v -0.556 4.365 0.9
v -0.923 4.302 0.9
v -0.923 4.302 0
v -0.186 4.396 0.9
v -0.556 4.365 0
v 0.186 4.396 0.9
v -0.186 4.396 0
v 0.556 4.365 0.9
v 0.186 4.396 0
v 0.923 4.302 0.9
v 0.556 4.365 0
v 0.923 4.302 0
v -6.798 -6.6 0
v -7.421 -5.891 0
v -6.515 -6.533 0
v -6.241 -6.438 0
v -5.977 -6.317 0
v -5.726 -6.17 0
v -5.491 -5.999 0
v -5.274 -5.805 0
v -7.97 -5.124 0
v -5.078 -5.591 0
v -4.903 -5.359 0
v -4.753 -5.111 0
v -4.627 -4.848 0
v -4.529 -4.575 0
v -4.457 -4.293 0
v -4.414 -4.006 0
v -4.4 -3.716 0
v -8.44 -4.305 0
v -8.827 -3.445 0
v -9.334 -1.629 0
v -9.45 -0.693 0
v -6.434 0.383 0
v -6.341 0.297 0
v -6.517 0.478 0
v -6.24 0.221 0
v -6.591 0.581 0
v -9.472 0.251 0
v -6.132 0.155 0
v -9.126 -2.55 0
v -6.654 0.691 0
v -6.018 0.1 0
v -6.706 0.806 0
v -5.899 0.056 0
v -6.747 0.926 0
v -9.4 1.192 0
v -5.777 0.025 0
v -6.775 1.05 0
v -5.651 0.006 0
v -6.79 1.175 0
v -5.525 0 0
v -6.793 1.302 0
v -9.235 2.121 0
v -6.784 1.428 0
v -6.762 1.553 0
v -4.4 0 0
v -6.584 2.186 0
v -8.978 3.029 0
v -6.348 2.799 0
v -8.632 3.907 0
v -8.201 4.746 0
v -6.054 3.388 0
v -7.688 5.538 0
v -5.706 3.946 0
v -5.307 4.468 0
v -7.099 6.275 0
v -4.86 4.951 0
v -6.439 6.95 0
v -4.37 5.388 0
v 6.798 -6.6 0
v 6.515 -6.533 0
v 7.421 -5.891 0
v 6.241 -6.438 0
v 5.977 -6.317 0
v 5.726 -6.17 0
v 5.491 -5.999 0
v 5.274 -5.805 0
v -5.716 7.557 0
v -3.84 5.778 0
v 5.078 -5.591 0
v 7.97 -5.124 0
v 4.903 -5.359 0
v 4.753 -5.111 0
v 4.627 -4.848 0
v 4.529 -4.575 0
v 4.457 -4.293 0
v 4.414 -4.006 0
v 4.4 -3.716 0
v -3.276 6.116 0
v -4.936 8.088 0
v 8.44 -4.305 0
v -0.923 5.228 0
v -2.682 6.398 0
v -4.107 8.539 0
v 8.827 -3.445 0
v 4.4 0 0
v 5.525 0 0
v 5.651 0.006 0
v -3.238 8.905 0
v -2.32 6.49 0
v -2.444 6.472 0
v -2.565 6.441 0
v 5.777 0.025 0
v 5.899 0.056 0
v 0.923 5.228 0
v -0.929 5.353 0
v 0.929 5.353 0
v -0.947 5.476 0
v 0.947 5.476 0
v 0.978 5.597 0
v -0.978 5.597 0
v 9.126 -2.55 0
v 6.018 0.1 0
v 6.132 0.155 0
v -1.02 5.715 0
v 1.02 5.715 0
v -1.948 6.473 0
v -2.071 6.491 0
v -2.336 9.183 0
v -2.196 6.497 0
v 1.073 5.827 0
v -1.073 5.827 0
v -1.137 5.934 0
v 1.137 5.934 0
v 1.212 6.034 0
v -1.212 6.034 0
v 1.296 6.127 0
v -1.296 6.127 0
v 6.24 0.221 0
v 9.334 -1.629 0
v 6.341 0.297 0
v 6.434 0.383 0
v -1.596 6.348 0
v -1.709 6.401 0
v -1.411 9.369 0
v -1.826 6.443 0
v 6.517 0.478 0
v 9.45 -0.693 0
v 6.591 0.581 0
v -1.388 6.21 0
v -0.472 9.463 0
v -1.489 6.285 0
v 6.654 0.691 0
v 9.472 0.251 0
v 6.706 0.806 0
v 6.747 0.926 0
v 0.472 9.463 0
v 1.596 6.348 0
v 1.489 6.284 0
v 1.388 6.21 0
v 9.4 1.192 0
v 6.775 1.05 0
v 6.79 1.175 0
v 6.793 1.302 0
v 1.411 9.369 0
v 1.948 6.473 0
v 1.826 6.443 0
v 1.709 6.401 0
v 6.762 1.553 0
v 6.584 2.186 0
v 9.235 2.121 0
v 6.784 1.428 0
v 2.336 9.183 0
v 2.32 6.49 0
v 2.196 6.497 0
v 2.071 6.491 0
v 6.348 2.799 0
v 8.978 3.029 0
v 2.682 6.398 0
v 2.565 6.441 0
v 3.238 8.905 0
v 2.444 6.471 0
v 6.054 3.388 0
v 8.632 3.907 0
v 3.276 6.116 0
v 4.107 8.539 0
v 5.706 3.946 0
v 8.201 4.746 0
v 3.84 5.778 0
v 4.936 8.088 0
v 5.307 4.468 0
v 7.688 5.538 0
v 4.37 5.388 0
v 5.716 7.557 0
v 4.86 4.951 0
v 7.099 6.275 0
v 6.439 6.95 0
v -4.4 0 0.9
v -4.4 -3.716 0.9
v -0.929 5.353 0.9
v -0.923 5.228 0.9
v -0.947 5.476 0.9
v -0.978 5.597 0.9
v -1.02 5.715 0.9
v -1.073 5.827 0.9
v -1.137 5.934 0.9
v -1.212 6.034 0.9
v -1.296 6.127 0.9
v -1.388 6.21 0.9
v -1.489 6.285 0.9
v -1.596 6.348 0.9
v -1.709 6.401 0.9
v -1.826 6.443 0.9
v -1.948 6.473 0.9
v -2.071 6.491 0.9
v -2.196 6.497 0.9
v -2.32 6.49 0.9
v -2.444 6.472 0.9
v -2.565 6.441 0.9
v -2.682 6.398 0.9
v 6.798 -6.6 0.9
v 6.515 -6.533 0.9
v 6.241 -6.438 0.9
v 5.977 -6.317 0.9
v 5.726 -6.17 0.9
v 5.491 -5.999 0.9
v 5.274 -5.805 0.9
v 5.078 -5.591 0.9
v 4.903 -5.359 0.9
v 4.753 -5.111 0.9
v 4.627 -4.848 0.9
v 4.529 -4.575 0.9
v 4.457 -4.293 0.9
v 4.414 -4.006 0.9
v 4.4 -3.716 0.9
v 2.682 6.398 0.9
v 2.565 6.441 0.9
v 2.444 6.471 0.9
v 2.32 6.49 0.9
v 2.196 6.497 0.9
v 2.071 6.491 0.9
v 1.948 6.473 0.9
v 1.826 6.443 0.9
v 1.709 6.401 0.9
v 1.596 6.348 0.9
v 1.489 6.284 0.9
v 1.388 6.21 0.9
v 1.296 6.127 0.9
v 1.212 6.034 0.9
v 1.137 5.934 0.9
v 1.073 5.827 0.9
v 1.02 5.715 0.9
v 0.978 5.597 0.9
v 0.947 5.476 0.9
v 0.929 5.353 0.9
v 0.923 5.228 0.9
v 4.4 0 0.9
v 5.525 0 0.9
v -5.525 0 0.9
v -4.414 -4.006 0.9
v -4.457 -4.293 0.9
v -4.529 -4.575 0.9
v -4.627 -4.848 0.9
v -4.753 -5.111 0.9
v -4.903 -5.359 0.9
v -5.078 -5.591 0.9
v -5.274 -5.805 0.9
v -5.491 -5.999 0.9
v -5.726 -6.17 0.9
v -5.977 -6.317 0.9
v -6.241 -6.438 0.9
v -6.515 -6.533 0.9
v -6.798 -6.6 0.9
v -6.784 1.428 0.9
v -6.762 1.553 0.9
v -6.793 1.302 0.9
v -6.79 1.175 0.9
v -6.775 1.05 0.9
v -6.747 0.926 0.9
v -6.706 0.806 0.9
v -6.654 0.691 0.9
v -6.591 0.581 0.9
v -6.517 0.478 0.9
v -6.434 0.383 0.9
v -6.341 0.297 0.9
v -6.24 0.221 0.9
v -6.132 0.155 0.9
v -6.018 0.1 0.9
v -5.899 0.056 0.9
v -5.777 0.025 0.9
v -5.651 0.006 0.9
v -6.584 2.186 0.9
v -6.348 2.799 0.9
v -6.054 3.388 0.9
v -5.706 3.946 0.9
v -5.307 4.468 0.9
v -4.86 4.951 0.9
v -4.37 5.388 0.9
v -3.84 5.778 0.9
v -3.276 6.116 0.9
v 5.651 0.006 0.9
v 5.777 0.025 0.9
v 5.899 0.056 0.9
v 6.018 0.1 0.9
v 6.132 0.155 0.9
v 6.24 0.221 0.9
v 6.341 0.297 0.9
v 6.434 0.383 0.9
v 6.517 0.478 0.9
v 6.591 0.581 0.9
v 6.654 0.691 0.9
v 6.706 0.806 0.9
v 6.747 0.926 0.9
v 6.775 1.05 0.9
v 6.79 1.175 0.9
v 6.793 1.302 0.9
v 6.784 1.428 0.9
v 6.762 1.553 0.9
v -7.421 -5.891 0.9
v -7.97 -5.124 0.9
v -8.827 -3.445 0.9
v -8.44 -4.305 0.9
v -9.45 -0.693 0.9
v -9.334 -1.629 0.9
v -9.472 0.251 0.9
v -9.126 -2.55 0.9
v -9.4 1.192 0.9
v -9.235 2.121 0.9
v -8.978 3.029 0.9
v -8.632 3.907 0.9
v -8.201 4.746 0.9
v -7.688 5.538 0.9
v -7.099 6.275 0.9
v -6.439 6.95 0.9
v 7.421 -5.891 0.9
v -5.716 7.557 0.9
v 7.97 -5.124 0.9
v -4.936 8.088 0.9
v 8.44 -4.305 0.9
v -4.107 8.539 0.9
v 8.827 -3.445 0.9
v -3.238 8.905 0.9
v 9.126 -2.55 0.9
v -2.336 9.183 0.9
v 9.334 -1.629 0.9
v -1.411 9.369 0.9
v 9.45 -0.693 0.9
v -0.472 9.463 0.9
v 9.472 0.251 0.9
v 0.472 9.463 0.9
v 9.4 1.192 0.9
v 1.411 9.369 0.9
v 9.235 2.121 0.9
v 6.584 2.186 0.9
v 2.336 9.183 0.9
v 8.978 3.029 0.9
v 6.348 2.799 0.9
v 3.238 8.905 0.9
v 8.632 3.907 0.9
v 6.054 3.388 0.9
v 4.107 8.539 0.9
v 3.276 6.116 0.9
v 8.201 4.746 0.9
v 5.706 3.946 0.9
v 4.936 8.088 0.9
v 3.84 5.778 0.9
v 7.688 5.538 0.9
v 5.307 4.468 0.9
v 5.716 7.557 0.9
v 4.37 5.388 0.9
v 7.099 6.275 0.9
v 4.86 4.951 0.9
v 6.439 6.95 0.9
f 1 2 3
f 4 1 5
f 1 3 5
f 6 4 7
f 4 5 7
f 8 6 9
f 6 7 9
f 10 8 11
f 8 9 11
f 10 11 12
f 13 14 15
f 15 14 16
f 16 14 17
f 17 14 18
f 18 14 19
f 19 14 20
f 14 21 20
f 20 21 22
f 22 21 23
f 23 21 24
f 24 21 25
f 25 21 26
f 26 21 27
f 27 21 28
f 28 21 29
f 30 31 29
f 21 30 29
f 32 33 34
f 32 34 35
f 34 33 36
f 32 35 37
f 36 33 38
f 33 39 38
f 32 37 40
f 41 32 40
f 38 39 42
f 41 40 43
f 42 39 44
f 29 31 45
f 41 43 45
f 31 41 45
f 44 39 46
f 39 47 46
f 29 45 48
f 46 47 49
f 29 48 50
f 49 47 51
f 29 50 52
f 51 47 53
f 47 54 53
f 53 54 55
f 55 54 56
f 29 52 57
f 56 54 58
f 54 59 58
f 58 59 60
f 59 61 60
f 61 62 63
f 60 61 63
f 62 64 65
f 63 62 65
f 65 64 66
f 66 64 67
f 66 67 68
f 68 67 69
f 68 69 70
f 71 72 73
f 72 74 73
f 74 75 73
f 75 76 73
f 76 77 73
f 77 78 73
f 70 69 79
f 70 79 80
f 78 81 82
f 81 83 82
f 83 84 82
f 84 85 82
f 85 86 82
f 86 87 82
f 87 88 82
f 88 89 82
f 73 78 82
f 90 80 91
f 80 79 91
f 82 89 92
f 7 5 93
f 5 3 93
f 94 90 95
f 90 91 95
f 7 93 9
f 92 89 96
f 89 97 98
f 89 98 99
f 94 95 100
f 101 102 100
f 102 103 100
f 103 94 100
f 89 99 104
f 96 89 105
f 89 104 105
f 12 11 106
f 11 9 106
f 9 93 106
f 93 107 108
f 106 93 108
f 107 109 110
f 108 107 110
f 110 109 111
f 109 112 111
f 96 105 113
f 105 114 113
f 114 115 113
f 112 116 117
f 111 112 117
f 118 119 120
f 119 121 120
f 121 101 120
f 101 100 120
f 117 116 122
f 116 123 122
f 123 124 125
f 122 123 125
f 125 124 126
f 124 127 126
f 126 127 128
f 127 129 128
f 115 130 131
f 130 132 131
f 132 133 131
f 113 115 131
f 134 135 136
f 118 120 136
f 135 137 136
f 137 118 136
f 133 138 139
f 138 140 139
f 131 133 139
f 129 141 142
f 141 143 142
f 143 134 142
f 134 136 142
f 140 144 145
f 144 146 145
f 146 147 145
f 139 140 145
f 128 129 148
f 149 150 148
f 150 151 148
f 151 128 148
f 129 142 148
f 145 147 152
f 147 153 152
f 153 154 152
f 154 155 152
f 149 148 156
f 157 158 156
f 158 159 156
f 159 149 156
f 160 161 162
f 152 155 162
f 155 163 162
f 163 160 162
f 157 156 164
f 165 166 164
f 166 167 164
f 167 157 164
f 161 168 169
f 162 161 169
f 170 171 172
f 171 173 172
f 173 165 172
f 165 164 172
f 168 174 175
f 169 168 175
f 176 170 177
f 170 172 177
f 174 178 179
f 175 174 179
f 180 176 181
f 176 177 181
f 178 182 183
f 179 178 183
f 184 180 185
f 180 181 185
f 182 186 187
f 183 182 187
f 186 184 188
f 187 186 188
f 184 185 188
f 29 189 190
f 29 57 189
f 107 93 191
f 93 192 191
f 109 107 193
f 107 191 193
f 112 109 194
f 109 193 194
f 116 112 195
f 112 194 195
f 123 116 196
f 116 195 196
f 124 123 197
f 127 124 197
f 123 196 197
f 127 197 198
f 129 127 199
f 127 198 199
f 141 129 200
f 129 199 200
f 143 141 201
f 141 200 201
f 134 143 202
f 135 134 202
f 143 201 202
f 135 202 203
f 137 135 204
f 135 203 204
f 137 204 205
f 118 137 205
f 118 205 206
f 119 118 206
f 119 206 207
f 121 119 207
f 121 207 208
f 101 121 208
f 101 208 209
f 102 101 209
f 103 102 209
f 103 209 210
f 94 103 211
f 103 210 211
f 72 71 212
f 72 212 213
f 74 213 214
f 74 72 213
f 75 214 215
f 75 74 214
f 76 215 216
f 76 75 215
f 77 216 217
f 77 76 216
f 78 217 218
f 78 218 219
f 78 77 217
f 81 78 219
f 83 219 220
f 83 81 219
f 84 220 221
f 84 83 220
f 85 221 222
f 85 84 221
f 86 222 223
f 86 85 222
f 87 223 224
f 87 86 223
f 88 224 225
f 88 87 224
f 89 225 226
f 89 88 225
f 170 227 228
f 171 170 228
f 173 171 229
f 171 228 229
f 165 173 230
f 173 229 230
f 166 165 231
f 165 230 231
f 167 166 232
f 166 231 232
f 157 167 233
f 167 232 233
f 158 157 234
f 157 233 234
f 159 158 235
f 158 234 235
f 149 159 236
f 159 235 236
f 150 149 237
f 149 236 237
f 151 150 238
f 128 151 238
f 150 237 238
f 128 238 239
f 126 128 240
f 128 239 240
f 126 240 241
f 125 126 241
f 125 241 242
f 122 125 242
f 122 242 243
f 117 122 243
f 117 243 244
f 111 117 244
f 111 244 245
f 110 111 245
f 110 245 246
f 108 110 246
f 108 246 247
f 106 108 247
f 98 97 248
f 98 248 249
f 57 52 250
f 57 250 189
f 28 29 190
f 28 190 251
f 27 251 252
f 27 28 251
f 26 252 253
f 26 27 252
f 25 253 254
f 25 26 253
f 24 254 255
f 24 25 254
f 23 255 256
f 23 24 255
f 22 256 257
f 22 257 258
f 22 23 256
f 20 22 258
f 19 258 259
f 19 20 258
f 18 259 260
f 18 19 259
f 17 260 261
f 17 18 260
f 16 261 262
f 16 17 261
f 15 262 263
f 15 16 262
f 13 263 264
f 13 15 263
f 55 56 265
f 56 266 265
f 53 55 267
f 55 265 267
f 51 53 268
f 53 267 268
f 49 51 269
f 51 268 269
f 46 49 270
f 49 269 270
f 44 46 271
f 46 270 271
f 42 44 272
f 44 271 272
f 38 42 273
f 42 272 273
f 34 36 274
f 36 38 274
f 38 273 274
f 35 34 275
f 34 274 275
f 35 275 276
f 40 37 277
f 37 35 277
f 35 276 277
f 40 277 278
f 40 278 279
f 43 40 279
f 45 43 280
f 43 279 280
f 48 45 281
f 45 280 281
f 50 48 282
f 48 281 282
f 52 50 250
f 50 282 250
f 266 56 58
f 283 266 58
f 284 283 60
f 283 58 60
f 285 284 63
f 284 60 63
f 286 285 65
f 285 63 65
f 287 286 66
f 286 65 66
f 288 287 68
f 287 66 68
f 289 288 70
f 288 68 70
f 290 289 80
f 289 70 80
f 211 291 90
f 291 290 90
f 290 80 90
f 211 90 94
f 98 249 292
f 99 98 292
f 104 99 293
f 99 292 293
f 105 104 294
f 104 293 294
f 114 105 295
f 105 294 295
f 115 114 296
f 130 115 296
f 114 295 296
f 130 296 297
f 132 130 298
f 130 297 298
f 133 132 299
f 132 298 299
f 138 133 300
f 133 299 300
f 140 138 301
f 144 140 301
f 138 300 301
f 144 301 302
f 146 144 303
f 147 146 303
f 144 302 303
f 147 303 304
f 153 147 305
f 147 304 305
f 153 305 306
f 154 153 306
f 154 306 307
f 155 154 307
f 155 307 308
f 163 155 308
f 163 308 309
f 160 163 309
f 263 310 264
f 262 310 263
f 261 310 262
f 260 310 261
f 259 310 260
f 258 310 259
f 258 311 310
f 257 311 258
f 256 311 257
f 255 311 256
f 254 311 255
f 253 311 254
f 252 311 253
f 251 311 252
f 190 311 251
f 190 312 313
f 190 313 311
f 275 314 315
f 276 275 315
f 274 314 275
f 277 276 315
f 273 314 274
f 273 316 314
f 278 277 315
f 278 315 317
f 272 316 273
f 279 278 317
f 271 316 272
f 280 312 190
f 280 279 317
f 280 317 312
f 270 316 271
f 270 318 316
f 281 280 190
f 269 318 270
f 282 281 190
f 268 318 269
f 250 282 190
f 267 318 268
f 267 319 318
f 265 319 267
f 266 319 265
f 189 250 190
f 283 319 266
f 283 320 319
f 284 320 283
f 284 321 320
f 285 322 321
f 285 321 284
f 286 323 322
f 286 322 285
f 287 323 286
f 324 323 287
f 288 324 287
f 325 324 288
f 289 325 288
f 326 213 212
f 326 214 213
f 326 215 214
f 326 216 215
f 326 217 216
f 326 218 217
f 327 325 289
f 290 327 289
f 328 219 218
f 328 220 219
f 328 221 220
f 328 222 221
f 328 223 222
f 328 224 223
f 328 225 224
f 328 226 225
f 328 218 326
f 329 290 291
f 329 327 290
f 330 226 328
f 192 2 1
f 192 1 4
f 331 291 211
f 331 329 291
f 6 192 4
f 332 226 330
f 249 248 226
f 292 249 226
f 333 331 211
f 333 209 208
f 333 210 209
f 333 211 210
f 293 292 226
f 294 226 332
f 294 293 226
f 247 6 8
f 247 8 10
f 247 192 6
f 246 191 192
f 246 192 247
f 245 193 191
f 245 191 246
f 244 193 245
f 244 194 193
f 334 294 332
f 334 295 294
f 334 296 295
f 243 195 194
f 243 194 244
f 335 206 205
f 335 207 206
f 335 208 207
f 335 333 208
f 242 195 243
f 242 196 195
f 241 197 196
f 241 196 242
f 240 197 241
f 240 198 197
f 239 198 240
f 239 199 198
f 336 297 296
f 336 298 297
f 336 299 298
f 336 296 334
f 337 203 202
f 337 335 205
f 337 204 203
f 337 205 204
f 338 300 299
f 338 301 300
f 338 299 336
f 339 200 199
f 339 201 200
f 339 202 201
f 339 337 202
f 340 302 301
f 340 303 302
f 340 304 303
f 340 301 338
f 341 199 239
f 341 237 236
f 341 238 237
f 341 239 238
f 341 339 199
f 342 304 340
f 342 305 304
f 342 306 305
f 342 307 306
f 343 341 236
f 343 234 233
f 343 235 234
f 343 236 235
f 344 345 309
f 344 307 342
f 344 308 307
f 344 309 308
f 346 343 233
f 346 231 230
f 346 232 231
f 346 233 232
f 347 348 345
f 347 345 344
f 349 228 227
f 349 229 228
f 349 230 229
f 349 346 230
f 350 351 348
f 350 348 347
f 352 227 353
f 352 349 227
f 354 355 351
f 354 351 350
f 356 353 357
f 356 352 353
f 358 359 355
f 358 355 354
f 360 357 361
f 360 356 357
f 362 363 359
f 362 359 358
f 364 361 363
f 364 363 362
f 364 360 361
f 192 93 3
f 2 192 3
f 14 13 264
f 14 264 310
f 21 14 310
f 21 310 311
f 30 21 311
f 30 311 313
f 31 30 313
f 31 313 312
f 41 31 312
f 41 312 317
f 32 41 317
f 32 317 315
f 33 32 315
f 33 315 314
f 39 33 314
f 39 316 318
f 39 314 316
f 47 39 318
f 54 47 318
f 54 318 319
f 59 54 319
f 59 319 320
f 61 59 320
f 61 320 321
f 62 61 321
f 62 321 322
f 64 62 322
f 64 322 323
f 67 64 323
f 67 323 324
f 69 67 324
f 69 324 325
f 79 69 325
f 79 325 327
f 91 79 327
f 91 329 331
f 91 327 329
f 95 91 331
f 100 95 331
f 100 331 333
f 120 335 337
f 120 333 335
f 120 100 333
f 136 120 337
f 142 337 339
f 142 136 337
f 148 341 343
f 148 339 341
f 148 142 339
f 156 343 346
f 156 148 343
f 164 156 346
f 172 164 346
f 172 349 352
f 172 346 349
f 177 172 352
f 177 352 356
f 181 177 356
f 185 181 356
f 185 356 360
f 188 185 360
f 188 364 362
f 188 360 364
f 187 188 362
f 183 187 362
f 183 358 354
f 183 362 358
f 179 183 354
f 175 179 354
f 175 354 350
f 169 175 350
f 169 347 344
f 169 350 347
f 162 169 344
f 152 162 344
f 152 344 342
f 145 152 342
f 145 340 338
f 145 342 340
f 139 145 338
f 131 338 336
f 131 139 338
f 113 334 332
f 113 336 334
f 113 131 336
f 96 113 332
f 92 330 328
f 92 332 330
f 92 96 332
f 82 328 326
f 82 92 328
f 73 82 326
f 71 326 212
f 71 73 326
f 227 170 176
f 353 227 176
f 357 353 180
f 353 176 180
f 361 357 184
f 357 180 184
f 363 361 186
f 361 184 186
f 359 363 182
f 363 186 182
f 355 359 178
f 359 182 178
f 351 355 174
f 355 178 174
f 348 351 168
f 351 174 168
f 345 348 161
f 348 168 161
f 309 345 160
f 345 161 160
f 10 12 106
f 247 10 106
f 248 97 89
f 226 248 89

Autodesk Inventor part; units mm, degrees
ref_plane "YZ Plane" through (0, 0, 0) normal (1, 0, 0) x (0, 1, 0)
ref_plane "XZ Plane" through (0, 0, 0) normal (0, 1, 0) x (-1, 0, 0)
ref_plane "XY Plane" through (0, 0, 0) normal (0, 0, 1) x (1, 0, 0)
sketch "草图2" plane through (0, 0, 0) normal (0, 0, 1) x (1, 0, 0)
  line L0 (-6.9375, 0) -> (-4.4, 0)
  arc A0 (-0.9227, 6.8759) -> (-6.9375, 0) centre (0, 0) ccw
  line L1 (-0.9227, 6.8759) -> (-0.9227, 4.3022)
  arc A1 (0.9227, 4.3022) -> (-0.9227, 4.3022) centre (0, 0) ccw
  line L2 (0.9227, 4.3022) -> (0.9227, 6.8759)
  arc A2 (6.9375, 0) -> (0.9227, 6.8759) centre (0, 0) ccw
  line L3 (4.4, 0) -> (6.9375, 0)
  arc A3 (6.7982, -6.6) -> (-6.7982, -6.6) centre (0, 0) ccw
  line L4 (0, -3.55) -> (0, 5.55) projected
  line L5 (-4.4, 0) -> (-4.4, -6.6)
  line L6 (-4.4, -6.6) -> (-6.7982, -6.6)
  line L7 (4.4, 0) -> (4.4, -6.6)
  line L8 (4.4, -6.6) -> (6.7982, -6.6)
  dimension "d29" = 18.95
  dimension "d33" = 13.875
  dimension "d39" = 0.9227
  dimension "d40" = 4.4
  dimension "d41" = 6.6
extrude "拉伸1" add sketch "草图2" along normal blind 0.9
fillet "圆角1" radius 1.2687 4 edges at (-6.9375, 0, 0.45) (-0.9227, 6.8759, 0.45) (0.9227, 6.8759, 0.45) (6.9375, 0, 0.45)
fillet "圆角2" radius 2.9333 2 edges at (-4.4, -6.6, 0.45) (4.4, -6.6, 0.45)
equation "\"d29\" = l2"
equation "\"d33\" = 0.5 * Diam2 + 0.5 * l2"
equation "\"d39\" = -0.0909091 * Diam2 + 0.0909091 * l2"
equation "\"d40\" = 0.5 * Diam2"
equation "\"d41\" = 0.75 * Diam2"
equation "\"d20\" = t1"
equation "\"d22\" = -0.125 * Diam2 + 0.125 * l2"
equation "\"d42\" = 0.333333 * Diam2"
equation "\"l2\" = 18.95"
equation "\"t1\" = 0.9"
equation "\"Diam2\" = 8.8"
equation "\"sd\" = 11"
equation "\"TEMPLATE\" = 1.2345"
properties part number "ASME B27.8M - 3EM1-11" material "钢，软"
